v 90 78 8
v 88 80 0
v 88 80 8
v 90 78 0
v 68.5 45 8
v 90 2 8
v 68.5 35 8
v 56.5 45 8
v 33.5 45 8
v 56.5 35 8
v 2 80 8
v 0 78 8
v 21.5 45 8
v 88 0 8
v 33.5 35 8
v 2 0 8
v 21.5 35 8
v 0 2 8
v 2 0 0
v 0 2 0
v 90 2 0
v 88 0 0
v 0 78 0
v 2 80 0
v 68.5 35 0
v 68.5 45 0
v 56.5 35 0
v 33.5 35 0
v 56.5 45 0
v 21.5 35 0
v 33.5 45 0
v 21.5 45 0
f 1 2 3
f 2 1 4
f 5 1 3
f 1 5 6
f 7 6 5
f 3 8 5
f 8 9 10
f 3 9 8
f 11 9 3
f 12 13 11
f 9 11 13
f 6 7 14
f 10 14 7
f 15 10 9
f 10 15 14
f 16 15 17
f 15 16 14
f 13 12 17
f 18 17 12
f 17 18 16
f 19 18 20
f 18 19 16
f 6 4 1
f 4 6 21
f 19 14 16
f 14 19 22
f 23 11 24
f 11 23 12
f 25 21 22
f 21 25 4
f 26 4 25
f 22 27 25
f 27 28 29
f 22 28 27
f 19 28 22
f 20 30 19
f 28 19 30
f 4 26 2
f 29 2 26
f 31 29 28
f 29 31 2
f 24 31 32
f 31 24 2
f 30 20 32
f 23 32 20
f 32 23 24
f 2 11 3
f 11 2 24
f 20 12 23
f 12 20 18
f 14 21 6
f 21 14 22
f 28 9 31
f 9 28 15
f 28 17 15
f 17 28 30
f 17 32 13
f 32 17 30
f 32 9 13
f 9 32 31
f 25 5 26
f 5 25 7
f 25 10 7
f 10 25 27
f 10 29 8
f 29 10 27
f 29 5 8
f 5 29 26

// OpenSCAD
$fn = 32;

// ----------------------------------------------------------------------
// Windowed plate: 2 voids, 90 x 80 x 8 mm
// ----------------------------------------------------------------------

// --- parameters (mm) ---
plate_l = 90;             // plate length, X
plate_w = 80;             // plate width, Y
plate_t = 8;              // plate thickness, Z
edge_margin = 10;         // wall from the plate edge to any window
windows = 2;              // number of windows in the row
win_l = 12;               // window length
win_w = 10;               // window width
win_pitch = 35;           // window pitch along X
depth_1 = 8;              // depth of void 1 (full thickness = through)
depth_2 = 8;              // depth of void 2 (full thickness = through)
corner_c = 2;             // corner chamfer of the plate

profile = [[2, 0], [88, 0], [90, 2], [90, 78], [88, 80], [2, 80], [0, 78], [0, 2]];  // primary outline, 8 points, counter clockwise
void_1 = [[21.5, 35], [33.5, 35], [33.5, 45], [21.5, 45]];  // window 1 of the row, 4 points
void_2 = [[56.5, 35], [68.5, 35], [68.5, 45], [56.5, 45]];  // window 2 of the row, 4 points

// --- the one profile operation ---
difference() {
  linear_extrude(height = plate_t) polygon(points = profile);
  translate([0, 0, -1])
    linear_extrude(height = plate_t + 2) polygon(points = void_1);
  translate([0, 0, -1])
    linear_extrude(height = plate_t + 2) polygon(points = void_2);
}
